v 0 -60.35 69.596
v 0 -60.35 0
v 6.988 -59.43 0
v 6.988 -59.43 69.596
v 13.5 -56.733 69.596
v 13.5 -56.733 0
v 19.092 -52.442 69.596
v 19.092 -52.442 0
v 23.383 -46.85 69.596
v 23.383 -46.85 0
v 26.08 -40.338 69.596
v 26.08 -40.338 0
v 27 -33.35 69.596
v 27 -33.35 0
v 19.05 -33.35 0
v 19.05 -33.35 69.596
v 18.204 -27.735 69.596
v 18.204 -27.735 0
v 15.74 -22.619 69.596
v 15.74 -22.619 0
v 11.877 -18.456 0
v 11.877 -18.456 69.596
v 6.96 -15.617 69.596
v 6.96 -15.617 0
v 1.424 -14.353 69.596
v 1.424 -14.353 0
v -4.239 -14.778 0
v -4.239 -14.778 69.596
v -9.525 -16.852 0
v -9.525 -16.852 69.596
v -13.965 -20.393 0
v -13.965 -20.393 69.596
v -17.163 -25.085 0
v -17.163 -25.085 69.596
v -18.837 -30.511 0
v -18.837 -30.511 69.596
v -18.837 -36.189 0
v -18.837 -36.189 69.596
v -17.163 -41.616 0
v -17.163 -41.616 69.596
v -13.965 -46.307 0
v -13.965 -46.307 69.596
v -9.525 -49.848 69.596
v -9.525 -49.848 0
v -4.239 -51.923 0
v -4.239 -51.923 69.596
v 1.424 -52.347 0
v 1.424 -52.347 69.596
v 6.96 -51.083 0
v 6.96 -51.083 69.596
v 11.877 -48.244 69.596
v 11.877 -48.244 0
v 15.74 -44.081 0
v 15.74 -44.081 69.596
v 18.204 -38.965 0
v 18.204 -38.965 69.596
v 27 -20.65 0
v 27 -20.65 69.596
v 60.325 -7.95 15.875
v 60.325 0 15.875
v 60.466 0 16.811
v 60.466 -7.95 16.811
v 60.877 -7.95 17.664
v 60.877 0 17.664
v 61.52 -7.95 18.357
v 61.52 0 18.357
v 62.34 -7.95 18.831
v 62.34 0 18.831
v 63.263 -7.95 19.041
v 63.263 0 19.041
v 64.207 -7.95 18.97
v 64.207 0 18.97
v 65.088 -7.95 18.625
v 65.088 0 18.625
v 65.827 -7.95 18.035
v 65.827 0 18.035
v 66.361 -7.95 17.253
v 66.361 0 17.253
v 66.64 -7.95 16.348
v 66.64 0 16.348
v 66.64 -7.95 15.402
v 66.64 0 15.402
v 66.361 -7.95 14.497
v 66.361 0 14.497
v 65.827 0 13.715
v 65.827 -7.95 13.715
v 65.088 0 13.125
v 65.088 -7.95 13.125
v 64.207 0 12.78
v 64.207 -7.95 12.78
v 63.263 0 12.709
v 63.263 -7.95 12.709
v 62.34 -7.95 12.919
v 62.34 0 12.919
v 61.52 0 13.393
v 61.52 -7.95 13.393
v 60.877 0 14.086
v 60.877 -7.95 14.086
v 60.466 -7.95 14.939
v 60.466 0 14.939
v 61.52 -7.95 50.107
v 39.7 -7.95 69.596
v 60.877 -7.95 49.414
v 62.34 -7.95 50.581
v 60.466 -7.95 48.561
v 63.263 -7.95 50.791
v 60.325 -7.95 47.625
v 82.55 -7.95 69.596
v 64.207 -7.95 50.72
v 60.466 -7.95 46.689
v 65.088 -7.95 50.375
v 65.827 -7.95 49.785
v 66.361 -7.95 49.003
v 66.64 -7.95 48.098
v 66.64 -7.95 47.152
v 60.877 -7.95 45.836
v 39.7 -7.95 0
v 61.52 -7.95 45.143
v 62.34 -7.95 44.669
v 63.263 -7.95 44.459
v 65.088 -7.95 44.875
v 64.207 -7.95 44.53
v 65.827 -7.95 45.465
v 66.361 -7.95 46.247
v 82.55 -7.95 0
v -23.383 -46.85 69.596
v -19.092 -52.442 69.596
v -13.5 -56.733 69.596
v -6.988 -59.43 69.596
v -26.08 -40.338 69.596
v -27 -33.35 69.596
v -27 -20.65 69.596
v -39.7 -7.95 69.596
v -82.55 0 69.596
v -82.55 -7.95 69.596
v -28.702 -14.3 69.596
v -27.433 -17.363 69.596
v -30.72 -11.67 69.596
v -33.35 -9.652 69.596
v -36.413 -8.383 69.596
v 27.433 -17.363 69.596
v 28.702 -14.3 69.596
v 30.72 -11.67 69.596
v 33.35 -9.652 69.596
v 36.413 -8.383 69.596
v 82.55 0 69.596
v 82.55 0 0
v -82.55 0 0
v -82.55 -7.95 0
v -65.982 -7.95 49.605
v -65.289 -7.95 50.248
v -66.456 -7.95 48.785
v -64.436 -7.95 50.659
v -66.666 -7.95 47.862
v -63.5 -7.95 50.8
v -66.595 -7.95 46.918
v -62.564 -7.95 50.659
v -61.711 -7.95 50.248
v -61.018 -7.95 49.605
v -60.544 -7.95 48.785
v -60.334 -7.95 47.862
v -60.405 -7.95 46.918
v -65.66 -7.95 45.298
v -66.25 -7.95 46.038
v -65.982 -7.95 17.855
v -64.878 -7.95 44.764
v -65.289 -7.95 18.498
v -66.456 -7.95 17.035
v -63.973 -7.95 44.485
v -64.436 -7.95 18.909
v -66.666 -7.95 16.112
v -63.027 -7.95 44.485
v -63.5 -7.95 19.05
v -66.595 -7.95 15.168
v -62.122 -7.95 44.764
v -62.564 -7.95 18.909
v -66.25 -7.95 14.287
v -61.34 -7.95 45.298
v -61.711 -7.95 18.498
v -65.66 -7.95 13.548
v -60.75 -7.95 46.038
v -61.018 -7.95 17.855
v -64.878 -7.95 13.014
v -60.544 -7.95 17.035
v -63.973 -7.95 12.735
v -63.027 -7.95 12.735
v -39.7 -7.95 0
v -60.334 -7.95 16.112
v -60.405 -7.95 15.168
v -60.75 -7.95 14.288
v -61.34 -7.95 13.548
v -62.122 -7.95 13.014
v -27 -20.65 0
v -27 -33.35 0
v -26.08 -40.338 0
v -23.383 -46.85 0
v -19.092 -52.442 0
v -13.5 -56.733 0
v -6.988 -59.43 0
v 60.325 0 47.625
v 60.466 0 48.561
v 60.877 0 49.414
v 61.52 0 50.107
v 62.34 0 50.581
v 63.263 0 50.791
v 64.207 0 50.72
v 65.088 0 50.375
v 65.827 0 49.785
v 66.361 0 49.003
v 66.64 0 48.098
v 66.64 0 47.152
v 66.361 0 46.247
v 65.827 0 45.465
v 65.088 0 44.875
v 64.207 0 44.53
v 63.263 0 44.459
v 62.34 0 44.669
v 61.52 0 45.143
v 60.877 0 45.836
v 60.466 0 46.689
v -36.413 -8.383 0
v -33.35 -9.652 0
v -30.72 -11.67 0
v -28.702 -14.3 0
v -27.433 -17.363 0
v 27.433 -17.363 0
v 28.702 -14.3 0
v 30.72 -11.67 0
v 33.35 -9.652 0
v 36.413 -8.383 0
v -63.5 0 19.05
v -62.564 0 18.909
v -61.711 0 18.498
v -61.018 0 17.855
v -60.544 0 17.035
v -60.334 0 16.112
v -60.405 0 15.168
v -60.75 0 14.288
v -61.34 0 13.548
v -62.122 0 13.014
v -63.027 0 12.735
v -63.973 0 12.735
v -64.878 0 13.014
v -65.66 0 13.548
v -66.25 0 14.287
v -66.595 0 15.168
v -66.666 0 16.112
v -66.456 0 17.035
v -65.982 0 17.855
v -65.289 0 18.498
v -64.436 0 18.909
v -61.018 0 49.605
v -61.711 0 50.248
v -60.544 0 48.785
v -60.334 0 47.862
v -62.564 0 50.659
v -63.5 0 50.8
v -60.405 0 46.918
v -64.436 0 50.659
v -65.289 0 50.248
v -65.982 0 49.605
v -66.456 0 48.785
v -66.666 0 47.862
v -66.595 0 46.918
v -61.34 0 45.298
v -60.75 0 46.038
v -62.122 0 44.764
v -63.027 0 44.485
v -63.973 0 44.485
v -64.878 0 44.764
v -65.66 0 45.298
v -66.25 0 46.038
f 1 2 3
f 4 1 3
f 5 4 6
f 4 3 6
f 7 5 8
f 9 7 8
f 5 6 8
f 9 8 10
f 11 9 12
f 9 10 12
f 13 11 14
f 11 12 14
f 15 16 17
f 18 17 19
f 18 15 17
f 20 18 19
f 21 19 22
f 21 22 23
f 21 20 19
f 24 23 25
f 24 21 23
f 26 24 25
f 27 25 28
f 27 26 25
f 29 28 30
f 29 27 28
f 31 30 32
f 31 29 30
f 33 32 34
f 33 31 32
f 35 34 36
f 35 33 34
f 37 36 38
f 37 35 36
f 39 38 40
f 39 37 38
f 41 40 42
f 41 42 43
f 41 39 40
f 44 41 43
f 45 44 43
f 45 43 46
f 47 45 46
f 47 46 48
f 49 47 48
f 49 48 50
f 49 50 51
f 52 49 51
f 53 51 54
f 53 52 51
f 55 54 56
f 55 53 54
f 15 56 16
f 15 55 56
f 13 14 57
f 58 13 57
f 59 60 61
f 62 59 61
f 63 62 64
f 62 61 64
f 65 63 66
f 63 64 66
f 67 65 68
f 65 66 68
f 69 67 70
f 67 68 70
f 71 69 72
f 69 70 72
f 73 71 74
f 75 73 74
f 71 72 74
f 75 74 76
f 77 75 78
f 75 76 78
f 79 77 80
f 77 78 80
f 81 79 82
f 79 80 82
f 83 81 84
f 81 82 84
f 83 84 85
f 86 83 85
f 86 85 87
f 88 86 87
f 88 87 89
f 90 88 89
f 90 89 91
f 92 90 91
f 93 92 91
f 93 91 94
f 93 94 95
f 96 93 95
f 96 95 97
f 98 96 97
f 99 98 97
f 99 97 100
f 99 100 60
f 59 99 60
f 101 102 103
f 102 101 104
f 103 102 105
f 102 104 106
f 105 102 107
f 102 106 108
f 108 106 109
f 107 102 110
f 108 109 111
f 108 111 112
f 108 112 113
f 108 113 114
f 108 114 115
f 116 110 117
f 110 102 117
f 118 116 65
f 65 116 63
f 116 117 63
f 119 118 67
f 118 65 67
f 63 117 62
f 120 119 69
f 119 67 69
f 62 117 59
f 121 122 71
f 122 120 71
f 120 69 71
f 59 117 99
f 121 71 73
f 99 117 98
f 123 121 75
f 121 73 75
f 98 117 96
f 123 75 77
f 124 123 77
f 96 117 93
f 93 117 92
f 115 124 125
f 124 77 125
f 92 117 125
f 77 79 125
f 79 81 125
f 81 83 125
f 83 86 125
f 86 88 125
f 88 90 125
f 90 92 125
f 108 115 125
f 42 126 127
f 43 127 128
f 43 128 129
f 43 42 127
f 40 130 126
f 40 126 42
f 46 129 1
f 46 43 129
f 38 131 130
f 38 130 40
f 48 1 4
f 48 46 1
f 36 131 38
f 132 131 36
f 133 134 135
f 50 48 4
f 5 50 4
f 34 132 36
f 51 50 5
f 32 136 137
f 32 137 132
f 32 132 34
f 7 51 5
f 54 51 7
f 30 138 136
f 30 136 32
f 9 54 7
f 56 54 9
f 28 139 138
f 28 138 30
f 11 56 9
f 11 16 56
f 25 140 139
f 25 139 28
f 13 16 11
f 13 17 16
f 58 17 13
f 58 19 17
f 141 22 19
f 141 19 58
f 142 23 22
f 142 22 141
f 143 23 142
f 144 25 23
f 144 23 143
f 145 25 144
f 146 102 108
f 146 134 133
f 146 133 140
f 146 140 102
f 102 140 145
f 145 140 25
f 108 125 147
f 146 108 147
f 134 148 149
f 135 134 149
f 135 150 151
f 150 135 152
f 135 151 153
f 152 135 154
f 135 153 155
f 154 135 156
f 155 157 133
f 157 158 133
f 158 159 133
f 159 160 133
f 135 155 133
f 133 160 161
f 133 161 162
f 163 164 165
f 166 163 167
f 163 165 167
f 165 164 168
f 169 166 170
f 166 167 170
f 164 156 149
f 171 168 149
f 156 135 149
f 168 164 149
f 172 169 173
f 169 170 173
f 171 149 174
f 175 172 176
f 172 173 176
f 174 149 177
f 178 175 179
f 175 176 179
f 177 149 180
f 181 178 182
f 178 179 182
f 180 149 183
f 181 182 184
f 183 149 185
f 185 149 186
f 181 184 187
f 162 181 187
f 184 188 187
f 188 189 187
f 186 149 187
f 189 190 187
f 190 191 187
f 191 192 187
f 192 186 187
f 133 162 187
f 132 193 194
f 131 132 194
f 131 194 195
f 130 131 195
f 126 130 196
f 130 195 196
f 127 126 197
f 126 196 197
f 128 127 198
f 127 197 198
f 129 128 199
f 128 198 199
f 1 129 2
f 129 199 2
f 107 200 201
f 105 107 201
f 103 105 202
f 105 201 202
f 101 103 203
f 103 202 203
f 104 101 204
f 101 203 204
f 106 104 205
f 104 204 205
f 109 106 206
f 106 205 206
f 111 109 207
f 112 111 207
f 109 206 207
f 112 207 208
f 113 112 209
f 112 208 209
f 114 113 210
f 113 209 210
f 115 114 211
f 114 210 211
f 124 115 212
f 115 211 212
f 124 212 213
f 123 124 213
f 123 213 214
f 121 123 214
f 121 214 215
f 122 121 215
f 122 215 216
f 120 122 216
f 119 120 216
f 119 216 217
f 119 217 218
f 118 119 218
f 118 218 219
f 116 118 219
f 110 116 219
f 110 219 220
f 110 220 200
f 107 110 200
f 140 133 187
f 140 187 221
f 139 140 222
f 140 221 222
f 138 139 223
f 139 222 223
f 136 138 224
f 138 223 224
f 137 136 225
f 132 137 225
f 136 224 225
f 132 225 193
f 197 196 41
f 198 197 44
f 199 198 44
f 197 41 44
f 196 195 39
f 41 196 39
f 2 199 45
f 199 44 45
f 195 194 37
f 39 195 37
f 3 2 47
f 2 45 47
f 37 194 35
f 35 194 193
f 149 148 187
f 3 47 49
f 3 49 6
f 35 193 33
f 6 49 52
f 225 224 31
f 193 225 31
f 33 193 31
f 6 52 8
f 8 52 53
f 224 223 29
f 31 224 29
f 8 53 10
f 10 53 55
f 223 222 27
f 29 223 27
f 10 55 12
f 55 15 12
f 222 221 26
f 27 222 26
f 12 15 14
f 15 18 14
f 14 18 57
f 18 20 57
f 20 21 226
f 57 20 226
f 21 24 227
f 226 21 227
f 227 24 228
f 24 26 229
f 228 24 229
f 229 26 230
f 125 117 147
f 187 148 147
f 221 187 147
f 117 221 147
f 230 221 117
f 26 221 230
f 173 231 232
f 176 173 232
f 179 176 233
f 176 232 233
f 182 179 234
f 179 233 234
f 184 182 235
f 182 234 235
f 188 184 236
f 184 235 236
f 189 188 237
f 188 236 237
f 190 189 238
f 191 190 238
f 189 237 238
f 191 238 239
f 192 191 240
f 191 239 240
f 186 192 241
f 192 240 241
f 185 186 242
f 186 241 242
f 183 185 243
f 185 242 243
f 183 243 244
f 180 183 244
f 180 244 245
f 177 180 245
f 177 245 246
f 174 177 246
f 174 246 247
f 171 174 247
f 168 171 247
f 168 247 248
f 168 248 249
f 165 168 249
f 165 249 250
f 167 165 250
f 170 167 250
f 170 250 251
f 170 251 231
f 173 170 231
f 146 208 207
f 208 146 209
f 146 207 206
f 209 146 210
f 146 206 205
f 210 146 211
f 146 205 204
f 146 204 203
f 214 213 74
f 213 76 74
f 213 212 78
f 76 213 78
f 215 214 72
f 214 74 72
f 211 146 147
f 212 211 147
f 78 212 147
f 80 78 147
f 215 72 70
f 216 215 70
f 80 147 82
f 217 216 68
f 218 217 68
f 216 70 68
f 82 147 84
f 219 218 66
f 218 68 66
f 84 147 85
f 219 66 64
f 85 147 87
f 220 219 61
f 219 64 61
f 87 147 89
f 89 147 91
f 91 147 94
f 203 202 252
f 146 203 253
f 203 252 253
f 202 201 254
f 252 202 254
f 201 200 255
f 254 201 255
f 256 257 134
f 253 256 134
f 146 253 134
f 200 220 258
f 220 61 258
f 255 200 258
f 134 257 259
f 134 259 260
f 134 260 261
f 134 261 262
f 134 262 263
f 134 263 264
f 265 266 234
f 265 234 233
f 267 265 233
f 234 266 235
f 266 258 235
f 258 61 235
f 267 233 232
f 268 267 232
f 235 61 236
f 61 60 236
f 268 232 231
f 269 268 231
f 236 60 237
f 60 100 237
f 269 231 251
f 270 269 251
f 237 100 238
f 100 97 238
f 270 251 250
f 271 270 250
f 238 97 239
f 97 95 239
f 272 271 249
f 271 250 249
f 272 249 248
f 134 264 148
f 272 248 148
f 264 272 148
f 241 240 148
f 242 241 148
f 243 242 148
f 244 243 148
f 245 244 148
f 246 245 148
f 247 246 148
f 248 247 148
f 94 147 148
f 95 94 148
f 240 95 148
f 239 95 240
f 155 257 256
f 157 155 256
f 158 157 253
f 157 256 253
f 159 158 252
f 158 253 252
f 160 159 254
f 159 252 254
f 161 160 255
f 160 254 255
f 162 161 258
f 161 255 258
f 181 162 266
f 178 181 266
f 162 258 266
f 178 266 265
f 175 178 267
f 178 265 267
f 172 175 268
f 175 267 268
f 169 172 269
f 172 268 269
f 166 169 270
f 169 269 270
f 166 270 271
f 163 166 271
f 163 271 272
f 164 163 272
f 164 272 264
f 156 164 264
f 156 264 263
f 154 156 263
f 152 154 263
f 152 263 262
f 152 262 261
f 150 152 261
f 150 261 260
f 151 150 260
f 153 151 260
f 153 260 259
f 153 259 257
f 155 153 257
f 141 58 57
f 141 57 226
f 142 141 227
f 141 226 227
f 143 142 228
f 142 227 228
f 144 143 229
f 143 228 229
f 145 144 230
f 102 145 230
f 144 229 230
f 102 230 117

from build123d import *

# Parameters (mm, degrees)
SKETCH1_R           = 19.05
BOSS_EXTRUDE1_DEPTH = 69.596
SKETCH2_R           = 3.175
CUT_EXTRUDE1_DEPTH  = 63.5


with BuildPart() as part:
    # Sketch1 → Boss-Extrude1 (new body)
    with BuildSketch(Plane.XY):
        with BuildLine():
            Line((82.55, 0), (-82.55, 0))
            Line((-82.55, 0), (-82.55, -7.9502))
            Line((-82.55, -7.9502), (-39.7002, -7.9502))
            ThreePointArc((-39.7002, -7.9502), (-30.719943879, -11.669943879), (-27.0002, -20.6502))
            Line((-27.0002, -20.6502), (-27.0002, -33.3502))
            ThreePointArc((-27.0002, -33.3502), (-19.092024562, -52.442224464), (-1.39e-07, -60.3504))
            ThreePointArc((-1.39e-07, -60.3504), (19.092024464, -52.442224562), (27.0002, -33.3502))
            Line((27.0002, -33.3502), (27.0002, -20.6502))
            ThreePointArc((27.0002, -20.6502), (30.719943879, -11.669943879), (39.7002, -7.9502))
            Line((39.7002, -7.9502), (82.55, -7.9502))
            Line((82.55, -7.9502), (82.55, 0))
        make_face()
        with Locations((0, -33.3502)):
            Circle(SKETCH1_R, mode=Mode.SUBTRACT)
    extrude(amount=BOSS_EXTRUDE1_DEPTH)

    # Sketch2 → Cut-Extrude1 (cut)
    with BuildSketch(Plane(origin=(0, 0, 0), x_dir=(1, 0, 0), z_dir=(0, 1, 0))):
        with Locations(Location((63.5, -15.875, 0), (0, 0, 180))):
            Circle(SKETCH2_R)
        with Locations(Location((63.5, -47.625, 0), (0, 0, 180))):
            Circle(SKETCH2_R)
        with Locations(Location((-63.5, -47.625, 0), (0, 0, 270))):
            Circle(SKETCH2_R)
        with Locations(Location((-63.5, -15.875, 0), (0, 0, 270))):
            Circle(SKETCH2_R)
    extrude(amount=-CUT_EXTRUDE1_DEPTH, mode=Mode.SUBTRACT)


solid = part.part
